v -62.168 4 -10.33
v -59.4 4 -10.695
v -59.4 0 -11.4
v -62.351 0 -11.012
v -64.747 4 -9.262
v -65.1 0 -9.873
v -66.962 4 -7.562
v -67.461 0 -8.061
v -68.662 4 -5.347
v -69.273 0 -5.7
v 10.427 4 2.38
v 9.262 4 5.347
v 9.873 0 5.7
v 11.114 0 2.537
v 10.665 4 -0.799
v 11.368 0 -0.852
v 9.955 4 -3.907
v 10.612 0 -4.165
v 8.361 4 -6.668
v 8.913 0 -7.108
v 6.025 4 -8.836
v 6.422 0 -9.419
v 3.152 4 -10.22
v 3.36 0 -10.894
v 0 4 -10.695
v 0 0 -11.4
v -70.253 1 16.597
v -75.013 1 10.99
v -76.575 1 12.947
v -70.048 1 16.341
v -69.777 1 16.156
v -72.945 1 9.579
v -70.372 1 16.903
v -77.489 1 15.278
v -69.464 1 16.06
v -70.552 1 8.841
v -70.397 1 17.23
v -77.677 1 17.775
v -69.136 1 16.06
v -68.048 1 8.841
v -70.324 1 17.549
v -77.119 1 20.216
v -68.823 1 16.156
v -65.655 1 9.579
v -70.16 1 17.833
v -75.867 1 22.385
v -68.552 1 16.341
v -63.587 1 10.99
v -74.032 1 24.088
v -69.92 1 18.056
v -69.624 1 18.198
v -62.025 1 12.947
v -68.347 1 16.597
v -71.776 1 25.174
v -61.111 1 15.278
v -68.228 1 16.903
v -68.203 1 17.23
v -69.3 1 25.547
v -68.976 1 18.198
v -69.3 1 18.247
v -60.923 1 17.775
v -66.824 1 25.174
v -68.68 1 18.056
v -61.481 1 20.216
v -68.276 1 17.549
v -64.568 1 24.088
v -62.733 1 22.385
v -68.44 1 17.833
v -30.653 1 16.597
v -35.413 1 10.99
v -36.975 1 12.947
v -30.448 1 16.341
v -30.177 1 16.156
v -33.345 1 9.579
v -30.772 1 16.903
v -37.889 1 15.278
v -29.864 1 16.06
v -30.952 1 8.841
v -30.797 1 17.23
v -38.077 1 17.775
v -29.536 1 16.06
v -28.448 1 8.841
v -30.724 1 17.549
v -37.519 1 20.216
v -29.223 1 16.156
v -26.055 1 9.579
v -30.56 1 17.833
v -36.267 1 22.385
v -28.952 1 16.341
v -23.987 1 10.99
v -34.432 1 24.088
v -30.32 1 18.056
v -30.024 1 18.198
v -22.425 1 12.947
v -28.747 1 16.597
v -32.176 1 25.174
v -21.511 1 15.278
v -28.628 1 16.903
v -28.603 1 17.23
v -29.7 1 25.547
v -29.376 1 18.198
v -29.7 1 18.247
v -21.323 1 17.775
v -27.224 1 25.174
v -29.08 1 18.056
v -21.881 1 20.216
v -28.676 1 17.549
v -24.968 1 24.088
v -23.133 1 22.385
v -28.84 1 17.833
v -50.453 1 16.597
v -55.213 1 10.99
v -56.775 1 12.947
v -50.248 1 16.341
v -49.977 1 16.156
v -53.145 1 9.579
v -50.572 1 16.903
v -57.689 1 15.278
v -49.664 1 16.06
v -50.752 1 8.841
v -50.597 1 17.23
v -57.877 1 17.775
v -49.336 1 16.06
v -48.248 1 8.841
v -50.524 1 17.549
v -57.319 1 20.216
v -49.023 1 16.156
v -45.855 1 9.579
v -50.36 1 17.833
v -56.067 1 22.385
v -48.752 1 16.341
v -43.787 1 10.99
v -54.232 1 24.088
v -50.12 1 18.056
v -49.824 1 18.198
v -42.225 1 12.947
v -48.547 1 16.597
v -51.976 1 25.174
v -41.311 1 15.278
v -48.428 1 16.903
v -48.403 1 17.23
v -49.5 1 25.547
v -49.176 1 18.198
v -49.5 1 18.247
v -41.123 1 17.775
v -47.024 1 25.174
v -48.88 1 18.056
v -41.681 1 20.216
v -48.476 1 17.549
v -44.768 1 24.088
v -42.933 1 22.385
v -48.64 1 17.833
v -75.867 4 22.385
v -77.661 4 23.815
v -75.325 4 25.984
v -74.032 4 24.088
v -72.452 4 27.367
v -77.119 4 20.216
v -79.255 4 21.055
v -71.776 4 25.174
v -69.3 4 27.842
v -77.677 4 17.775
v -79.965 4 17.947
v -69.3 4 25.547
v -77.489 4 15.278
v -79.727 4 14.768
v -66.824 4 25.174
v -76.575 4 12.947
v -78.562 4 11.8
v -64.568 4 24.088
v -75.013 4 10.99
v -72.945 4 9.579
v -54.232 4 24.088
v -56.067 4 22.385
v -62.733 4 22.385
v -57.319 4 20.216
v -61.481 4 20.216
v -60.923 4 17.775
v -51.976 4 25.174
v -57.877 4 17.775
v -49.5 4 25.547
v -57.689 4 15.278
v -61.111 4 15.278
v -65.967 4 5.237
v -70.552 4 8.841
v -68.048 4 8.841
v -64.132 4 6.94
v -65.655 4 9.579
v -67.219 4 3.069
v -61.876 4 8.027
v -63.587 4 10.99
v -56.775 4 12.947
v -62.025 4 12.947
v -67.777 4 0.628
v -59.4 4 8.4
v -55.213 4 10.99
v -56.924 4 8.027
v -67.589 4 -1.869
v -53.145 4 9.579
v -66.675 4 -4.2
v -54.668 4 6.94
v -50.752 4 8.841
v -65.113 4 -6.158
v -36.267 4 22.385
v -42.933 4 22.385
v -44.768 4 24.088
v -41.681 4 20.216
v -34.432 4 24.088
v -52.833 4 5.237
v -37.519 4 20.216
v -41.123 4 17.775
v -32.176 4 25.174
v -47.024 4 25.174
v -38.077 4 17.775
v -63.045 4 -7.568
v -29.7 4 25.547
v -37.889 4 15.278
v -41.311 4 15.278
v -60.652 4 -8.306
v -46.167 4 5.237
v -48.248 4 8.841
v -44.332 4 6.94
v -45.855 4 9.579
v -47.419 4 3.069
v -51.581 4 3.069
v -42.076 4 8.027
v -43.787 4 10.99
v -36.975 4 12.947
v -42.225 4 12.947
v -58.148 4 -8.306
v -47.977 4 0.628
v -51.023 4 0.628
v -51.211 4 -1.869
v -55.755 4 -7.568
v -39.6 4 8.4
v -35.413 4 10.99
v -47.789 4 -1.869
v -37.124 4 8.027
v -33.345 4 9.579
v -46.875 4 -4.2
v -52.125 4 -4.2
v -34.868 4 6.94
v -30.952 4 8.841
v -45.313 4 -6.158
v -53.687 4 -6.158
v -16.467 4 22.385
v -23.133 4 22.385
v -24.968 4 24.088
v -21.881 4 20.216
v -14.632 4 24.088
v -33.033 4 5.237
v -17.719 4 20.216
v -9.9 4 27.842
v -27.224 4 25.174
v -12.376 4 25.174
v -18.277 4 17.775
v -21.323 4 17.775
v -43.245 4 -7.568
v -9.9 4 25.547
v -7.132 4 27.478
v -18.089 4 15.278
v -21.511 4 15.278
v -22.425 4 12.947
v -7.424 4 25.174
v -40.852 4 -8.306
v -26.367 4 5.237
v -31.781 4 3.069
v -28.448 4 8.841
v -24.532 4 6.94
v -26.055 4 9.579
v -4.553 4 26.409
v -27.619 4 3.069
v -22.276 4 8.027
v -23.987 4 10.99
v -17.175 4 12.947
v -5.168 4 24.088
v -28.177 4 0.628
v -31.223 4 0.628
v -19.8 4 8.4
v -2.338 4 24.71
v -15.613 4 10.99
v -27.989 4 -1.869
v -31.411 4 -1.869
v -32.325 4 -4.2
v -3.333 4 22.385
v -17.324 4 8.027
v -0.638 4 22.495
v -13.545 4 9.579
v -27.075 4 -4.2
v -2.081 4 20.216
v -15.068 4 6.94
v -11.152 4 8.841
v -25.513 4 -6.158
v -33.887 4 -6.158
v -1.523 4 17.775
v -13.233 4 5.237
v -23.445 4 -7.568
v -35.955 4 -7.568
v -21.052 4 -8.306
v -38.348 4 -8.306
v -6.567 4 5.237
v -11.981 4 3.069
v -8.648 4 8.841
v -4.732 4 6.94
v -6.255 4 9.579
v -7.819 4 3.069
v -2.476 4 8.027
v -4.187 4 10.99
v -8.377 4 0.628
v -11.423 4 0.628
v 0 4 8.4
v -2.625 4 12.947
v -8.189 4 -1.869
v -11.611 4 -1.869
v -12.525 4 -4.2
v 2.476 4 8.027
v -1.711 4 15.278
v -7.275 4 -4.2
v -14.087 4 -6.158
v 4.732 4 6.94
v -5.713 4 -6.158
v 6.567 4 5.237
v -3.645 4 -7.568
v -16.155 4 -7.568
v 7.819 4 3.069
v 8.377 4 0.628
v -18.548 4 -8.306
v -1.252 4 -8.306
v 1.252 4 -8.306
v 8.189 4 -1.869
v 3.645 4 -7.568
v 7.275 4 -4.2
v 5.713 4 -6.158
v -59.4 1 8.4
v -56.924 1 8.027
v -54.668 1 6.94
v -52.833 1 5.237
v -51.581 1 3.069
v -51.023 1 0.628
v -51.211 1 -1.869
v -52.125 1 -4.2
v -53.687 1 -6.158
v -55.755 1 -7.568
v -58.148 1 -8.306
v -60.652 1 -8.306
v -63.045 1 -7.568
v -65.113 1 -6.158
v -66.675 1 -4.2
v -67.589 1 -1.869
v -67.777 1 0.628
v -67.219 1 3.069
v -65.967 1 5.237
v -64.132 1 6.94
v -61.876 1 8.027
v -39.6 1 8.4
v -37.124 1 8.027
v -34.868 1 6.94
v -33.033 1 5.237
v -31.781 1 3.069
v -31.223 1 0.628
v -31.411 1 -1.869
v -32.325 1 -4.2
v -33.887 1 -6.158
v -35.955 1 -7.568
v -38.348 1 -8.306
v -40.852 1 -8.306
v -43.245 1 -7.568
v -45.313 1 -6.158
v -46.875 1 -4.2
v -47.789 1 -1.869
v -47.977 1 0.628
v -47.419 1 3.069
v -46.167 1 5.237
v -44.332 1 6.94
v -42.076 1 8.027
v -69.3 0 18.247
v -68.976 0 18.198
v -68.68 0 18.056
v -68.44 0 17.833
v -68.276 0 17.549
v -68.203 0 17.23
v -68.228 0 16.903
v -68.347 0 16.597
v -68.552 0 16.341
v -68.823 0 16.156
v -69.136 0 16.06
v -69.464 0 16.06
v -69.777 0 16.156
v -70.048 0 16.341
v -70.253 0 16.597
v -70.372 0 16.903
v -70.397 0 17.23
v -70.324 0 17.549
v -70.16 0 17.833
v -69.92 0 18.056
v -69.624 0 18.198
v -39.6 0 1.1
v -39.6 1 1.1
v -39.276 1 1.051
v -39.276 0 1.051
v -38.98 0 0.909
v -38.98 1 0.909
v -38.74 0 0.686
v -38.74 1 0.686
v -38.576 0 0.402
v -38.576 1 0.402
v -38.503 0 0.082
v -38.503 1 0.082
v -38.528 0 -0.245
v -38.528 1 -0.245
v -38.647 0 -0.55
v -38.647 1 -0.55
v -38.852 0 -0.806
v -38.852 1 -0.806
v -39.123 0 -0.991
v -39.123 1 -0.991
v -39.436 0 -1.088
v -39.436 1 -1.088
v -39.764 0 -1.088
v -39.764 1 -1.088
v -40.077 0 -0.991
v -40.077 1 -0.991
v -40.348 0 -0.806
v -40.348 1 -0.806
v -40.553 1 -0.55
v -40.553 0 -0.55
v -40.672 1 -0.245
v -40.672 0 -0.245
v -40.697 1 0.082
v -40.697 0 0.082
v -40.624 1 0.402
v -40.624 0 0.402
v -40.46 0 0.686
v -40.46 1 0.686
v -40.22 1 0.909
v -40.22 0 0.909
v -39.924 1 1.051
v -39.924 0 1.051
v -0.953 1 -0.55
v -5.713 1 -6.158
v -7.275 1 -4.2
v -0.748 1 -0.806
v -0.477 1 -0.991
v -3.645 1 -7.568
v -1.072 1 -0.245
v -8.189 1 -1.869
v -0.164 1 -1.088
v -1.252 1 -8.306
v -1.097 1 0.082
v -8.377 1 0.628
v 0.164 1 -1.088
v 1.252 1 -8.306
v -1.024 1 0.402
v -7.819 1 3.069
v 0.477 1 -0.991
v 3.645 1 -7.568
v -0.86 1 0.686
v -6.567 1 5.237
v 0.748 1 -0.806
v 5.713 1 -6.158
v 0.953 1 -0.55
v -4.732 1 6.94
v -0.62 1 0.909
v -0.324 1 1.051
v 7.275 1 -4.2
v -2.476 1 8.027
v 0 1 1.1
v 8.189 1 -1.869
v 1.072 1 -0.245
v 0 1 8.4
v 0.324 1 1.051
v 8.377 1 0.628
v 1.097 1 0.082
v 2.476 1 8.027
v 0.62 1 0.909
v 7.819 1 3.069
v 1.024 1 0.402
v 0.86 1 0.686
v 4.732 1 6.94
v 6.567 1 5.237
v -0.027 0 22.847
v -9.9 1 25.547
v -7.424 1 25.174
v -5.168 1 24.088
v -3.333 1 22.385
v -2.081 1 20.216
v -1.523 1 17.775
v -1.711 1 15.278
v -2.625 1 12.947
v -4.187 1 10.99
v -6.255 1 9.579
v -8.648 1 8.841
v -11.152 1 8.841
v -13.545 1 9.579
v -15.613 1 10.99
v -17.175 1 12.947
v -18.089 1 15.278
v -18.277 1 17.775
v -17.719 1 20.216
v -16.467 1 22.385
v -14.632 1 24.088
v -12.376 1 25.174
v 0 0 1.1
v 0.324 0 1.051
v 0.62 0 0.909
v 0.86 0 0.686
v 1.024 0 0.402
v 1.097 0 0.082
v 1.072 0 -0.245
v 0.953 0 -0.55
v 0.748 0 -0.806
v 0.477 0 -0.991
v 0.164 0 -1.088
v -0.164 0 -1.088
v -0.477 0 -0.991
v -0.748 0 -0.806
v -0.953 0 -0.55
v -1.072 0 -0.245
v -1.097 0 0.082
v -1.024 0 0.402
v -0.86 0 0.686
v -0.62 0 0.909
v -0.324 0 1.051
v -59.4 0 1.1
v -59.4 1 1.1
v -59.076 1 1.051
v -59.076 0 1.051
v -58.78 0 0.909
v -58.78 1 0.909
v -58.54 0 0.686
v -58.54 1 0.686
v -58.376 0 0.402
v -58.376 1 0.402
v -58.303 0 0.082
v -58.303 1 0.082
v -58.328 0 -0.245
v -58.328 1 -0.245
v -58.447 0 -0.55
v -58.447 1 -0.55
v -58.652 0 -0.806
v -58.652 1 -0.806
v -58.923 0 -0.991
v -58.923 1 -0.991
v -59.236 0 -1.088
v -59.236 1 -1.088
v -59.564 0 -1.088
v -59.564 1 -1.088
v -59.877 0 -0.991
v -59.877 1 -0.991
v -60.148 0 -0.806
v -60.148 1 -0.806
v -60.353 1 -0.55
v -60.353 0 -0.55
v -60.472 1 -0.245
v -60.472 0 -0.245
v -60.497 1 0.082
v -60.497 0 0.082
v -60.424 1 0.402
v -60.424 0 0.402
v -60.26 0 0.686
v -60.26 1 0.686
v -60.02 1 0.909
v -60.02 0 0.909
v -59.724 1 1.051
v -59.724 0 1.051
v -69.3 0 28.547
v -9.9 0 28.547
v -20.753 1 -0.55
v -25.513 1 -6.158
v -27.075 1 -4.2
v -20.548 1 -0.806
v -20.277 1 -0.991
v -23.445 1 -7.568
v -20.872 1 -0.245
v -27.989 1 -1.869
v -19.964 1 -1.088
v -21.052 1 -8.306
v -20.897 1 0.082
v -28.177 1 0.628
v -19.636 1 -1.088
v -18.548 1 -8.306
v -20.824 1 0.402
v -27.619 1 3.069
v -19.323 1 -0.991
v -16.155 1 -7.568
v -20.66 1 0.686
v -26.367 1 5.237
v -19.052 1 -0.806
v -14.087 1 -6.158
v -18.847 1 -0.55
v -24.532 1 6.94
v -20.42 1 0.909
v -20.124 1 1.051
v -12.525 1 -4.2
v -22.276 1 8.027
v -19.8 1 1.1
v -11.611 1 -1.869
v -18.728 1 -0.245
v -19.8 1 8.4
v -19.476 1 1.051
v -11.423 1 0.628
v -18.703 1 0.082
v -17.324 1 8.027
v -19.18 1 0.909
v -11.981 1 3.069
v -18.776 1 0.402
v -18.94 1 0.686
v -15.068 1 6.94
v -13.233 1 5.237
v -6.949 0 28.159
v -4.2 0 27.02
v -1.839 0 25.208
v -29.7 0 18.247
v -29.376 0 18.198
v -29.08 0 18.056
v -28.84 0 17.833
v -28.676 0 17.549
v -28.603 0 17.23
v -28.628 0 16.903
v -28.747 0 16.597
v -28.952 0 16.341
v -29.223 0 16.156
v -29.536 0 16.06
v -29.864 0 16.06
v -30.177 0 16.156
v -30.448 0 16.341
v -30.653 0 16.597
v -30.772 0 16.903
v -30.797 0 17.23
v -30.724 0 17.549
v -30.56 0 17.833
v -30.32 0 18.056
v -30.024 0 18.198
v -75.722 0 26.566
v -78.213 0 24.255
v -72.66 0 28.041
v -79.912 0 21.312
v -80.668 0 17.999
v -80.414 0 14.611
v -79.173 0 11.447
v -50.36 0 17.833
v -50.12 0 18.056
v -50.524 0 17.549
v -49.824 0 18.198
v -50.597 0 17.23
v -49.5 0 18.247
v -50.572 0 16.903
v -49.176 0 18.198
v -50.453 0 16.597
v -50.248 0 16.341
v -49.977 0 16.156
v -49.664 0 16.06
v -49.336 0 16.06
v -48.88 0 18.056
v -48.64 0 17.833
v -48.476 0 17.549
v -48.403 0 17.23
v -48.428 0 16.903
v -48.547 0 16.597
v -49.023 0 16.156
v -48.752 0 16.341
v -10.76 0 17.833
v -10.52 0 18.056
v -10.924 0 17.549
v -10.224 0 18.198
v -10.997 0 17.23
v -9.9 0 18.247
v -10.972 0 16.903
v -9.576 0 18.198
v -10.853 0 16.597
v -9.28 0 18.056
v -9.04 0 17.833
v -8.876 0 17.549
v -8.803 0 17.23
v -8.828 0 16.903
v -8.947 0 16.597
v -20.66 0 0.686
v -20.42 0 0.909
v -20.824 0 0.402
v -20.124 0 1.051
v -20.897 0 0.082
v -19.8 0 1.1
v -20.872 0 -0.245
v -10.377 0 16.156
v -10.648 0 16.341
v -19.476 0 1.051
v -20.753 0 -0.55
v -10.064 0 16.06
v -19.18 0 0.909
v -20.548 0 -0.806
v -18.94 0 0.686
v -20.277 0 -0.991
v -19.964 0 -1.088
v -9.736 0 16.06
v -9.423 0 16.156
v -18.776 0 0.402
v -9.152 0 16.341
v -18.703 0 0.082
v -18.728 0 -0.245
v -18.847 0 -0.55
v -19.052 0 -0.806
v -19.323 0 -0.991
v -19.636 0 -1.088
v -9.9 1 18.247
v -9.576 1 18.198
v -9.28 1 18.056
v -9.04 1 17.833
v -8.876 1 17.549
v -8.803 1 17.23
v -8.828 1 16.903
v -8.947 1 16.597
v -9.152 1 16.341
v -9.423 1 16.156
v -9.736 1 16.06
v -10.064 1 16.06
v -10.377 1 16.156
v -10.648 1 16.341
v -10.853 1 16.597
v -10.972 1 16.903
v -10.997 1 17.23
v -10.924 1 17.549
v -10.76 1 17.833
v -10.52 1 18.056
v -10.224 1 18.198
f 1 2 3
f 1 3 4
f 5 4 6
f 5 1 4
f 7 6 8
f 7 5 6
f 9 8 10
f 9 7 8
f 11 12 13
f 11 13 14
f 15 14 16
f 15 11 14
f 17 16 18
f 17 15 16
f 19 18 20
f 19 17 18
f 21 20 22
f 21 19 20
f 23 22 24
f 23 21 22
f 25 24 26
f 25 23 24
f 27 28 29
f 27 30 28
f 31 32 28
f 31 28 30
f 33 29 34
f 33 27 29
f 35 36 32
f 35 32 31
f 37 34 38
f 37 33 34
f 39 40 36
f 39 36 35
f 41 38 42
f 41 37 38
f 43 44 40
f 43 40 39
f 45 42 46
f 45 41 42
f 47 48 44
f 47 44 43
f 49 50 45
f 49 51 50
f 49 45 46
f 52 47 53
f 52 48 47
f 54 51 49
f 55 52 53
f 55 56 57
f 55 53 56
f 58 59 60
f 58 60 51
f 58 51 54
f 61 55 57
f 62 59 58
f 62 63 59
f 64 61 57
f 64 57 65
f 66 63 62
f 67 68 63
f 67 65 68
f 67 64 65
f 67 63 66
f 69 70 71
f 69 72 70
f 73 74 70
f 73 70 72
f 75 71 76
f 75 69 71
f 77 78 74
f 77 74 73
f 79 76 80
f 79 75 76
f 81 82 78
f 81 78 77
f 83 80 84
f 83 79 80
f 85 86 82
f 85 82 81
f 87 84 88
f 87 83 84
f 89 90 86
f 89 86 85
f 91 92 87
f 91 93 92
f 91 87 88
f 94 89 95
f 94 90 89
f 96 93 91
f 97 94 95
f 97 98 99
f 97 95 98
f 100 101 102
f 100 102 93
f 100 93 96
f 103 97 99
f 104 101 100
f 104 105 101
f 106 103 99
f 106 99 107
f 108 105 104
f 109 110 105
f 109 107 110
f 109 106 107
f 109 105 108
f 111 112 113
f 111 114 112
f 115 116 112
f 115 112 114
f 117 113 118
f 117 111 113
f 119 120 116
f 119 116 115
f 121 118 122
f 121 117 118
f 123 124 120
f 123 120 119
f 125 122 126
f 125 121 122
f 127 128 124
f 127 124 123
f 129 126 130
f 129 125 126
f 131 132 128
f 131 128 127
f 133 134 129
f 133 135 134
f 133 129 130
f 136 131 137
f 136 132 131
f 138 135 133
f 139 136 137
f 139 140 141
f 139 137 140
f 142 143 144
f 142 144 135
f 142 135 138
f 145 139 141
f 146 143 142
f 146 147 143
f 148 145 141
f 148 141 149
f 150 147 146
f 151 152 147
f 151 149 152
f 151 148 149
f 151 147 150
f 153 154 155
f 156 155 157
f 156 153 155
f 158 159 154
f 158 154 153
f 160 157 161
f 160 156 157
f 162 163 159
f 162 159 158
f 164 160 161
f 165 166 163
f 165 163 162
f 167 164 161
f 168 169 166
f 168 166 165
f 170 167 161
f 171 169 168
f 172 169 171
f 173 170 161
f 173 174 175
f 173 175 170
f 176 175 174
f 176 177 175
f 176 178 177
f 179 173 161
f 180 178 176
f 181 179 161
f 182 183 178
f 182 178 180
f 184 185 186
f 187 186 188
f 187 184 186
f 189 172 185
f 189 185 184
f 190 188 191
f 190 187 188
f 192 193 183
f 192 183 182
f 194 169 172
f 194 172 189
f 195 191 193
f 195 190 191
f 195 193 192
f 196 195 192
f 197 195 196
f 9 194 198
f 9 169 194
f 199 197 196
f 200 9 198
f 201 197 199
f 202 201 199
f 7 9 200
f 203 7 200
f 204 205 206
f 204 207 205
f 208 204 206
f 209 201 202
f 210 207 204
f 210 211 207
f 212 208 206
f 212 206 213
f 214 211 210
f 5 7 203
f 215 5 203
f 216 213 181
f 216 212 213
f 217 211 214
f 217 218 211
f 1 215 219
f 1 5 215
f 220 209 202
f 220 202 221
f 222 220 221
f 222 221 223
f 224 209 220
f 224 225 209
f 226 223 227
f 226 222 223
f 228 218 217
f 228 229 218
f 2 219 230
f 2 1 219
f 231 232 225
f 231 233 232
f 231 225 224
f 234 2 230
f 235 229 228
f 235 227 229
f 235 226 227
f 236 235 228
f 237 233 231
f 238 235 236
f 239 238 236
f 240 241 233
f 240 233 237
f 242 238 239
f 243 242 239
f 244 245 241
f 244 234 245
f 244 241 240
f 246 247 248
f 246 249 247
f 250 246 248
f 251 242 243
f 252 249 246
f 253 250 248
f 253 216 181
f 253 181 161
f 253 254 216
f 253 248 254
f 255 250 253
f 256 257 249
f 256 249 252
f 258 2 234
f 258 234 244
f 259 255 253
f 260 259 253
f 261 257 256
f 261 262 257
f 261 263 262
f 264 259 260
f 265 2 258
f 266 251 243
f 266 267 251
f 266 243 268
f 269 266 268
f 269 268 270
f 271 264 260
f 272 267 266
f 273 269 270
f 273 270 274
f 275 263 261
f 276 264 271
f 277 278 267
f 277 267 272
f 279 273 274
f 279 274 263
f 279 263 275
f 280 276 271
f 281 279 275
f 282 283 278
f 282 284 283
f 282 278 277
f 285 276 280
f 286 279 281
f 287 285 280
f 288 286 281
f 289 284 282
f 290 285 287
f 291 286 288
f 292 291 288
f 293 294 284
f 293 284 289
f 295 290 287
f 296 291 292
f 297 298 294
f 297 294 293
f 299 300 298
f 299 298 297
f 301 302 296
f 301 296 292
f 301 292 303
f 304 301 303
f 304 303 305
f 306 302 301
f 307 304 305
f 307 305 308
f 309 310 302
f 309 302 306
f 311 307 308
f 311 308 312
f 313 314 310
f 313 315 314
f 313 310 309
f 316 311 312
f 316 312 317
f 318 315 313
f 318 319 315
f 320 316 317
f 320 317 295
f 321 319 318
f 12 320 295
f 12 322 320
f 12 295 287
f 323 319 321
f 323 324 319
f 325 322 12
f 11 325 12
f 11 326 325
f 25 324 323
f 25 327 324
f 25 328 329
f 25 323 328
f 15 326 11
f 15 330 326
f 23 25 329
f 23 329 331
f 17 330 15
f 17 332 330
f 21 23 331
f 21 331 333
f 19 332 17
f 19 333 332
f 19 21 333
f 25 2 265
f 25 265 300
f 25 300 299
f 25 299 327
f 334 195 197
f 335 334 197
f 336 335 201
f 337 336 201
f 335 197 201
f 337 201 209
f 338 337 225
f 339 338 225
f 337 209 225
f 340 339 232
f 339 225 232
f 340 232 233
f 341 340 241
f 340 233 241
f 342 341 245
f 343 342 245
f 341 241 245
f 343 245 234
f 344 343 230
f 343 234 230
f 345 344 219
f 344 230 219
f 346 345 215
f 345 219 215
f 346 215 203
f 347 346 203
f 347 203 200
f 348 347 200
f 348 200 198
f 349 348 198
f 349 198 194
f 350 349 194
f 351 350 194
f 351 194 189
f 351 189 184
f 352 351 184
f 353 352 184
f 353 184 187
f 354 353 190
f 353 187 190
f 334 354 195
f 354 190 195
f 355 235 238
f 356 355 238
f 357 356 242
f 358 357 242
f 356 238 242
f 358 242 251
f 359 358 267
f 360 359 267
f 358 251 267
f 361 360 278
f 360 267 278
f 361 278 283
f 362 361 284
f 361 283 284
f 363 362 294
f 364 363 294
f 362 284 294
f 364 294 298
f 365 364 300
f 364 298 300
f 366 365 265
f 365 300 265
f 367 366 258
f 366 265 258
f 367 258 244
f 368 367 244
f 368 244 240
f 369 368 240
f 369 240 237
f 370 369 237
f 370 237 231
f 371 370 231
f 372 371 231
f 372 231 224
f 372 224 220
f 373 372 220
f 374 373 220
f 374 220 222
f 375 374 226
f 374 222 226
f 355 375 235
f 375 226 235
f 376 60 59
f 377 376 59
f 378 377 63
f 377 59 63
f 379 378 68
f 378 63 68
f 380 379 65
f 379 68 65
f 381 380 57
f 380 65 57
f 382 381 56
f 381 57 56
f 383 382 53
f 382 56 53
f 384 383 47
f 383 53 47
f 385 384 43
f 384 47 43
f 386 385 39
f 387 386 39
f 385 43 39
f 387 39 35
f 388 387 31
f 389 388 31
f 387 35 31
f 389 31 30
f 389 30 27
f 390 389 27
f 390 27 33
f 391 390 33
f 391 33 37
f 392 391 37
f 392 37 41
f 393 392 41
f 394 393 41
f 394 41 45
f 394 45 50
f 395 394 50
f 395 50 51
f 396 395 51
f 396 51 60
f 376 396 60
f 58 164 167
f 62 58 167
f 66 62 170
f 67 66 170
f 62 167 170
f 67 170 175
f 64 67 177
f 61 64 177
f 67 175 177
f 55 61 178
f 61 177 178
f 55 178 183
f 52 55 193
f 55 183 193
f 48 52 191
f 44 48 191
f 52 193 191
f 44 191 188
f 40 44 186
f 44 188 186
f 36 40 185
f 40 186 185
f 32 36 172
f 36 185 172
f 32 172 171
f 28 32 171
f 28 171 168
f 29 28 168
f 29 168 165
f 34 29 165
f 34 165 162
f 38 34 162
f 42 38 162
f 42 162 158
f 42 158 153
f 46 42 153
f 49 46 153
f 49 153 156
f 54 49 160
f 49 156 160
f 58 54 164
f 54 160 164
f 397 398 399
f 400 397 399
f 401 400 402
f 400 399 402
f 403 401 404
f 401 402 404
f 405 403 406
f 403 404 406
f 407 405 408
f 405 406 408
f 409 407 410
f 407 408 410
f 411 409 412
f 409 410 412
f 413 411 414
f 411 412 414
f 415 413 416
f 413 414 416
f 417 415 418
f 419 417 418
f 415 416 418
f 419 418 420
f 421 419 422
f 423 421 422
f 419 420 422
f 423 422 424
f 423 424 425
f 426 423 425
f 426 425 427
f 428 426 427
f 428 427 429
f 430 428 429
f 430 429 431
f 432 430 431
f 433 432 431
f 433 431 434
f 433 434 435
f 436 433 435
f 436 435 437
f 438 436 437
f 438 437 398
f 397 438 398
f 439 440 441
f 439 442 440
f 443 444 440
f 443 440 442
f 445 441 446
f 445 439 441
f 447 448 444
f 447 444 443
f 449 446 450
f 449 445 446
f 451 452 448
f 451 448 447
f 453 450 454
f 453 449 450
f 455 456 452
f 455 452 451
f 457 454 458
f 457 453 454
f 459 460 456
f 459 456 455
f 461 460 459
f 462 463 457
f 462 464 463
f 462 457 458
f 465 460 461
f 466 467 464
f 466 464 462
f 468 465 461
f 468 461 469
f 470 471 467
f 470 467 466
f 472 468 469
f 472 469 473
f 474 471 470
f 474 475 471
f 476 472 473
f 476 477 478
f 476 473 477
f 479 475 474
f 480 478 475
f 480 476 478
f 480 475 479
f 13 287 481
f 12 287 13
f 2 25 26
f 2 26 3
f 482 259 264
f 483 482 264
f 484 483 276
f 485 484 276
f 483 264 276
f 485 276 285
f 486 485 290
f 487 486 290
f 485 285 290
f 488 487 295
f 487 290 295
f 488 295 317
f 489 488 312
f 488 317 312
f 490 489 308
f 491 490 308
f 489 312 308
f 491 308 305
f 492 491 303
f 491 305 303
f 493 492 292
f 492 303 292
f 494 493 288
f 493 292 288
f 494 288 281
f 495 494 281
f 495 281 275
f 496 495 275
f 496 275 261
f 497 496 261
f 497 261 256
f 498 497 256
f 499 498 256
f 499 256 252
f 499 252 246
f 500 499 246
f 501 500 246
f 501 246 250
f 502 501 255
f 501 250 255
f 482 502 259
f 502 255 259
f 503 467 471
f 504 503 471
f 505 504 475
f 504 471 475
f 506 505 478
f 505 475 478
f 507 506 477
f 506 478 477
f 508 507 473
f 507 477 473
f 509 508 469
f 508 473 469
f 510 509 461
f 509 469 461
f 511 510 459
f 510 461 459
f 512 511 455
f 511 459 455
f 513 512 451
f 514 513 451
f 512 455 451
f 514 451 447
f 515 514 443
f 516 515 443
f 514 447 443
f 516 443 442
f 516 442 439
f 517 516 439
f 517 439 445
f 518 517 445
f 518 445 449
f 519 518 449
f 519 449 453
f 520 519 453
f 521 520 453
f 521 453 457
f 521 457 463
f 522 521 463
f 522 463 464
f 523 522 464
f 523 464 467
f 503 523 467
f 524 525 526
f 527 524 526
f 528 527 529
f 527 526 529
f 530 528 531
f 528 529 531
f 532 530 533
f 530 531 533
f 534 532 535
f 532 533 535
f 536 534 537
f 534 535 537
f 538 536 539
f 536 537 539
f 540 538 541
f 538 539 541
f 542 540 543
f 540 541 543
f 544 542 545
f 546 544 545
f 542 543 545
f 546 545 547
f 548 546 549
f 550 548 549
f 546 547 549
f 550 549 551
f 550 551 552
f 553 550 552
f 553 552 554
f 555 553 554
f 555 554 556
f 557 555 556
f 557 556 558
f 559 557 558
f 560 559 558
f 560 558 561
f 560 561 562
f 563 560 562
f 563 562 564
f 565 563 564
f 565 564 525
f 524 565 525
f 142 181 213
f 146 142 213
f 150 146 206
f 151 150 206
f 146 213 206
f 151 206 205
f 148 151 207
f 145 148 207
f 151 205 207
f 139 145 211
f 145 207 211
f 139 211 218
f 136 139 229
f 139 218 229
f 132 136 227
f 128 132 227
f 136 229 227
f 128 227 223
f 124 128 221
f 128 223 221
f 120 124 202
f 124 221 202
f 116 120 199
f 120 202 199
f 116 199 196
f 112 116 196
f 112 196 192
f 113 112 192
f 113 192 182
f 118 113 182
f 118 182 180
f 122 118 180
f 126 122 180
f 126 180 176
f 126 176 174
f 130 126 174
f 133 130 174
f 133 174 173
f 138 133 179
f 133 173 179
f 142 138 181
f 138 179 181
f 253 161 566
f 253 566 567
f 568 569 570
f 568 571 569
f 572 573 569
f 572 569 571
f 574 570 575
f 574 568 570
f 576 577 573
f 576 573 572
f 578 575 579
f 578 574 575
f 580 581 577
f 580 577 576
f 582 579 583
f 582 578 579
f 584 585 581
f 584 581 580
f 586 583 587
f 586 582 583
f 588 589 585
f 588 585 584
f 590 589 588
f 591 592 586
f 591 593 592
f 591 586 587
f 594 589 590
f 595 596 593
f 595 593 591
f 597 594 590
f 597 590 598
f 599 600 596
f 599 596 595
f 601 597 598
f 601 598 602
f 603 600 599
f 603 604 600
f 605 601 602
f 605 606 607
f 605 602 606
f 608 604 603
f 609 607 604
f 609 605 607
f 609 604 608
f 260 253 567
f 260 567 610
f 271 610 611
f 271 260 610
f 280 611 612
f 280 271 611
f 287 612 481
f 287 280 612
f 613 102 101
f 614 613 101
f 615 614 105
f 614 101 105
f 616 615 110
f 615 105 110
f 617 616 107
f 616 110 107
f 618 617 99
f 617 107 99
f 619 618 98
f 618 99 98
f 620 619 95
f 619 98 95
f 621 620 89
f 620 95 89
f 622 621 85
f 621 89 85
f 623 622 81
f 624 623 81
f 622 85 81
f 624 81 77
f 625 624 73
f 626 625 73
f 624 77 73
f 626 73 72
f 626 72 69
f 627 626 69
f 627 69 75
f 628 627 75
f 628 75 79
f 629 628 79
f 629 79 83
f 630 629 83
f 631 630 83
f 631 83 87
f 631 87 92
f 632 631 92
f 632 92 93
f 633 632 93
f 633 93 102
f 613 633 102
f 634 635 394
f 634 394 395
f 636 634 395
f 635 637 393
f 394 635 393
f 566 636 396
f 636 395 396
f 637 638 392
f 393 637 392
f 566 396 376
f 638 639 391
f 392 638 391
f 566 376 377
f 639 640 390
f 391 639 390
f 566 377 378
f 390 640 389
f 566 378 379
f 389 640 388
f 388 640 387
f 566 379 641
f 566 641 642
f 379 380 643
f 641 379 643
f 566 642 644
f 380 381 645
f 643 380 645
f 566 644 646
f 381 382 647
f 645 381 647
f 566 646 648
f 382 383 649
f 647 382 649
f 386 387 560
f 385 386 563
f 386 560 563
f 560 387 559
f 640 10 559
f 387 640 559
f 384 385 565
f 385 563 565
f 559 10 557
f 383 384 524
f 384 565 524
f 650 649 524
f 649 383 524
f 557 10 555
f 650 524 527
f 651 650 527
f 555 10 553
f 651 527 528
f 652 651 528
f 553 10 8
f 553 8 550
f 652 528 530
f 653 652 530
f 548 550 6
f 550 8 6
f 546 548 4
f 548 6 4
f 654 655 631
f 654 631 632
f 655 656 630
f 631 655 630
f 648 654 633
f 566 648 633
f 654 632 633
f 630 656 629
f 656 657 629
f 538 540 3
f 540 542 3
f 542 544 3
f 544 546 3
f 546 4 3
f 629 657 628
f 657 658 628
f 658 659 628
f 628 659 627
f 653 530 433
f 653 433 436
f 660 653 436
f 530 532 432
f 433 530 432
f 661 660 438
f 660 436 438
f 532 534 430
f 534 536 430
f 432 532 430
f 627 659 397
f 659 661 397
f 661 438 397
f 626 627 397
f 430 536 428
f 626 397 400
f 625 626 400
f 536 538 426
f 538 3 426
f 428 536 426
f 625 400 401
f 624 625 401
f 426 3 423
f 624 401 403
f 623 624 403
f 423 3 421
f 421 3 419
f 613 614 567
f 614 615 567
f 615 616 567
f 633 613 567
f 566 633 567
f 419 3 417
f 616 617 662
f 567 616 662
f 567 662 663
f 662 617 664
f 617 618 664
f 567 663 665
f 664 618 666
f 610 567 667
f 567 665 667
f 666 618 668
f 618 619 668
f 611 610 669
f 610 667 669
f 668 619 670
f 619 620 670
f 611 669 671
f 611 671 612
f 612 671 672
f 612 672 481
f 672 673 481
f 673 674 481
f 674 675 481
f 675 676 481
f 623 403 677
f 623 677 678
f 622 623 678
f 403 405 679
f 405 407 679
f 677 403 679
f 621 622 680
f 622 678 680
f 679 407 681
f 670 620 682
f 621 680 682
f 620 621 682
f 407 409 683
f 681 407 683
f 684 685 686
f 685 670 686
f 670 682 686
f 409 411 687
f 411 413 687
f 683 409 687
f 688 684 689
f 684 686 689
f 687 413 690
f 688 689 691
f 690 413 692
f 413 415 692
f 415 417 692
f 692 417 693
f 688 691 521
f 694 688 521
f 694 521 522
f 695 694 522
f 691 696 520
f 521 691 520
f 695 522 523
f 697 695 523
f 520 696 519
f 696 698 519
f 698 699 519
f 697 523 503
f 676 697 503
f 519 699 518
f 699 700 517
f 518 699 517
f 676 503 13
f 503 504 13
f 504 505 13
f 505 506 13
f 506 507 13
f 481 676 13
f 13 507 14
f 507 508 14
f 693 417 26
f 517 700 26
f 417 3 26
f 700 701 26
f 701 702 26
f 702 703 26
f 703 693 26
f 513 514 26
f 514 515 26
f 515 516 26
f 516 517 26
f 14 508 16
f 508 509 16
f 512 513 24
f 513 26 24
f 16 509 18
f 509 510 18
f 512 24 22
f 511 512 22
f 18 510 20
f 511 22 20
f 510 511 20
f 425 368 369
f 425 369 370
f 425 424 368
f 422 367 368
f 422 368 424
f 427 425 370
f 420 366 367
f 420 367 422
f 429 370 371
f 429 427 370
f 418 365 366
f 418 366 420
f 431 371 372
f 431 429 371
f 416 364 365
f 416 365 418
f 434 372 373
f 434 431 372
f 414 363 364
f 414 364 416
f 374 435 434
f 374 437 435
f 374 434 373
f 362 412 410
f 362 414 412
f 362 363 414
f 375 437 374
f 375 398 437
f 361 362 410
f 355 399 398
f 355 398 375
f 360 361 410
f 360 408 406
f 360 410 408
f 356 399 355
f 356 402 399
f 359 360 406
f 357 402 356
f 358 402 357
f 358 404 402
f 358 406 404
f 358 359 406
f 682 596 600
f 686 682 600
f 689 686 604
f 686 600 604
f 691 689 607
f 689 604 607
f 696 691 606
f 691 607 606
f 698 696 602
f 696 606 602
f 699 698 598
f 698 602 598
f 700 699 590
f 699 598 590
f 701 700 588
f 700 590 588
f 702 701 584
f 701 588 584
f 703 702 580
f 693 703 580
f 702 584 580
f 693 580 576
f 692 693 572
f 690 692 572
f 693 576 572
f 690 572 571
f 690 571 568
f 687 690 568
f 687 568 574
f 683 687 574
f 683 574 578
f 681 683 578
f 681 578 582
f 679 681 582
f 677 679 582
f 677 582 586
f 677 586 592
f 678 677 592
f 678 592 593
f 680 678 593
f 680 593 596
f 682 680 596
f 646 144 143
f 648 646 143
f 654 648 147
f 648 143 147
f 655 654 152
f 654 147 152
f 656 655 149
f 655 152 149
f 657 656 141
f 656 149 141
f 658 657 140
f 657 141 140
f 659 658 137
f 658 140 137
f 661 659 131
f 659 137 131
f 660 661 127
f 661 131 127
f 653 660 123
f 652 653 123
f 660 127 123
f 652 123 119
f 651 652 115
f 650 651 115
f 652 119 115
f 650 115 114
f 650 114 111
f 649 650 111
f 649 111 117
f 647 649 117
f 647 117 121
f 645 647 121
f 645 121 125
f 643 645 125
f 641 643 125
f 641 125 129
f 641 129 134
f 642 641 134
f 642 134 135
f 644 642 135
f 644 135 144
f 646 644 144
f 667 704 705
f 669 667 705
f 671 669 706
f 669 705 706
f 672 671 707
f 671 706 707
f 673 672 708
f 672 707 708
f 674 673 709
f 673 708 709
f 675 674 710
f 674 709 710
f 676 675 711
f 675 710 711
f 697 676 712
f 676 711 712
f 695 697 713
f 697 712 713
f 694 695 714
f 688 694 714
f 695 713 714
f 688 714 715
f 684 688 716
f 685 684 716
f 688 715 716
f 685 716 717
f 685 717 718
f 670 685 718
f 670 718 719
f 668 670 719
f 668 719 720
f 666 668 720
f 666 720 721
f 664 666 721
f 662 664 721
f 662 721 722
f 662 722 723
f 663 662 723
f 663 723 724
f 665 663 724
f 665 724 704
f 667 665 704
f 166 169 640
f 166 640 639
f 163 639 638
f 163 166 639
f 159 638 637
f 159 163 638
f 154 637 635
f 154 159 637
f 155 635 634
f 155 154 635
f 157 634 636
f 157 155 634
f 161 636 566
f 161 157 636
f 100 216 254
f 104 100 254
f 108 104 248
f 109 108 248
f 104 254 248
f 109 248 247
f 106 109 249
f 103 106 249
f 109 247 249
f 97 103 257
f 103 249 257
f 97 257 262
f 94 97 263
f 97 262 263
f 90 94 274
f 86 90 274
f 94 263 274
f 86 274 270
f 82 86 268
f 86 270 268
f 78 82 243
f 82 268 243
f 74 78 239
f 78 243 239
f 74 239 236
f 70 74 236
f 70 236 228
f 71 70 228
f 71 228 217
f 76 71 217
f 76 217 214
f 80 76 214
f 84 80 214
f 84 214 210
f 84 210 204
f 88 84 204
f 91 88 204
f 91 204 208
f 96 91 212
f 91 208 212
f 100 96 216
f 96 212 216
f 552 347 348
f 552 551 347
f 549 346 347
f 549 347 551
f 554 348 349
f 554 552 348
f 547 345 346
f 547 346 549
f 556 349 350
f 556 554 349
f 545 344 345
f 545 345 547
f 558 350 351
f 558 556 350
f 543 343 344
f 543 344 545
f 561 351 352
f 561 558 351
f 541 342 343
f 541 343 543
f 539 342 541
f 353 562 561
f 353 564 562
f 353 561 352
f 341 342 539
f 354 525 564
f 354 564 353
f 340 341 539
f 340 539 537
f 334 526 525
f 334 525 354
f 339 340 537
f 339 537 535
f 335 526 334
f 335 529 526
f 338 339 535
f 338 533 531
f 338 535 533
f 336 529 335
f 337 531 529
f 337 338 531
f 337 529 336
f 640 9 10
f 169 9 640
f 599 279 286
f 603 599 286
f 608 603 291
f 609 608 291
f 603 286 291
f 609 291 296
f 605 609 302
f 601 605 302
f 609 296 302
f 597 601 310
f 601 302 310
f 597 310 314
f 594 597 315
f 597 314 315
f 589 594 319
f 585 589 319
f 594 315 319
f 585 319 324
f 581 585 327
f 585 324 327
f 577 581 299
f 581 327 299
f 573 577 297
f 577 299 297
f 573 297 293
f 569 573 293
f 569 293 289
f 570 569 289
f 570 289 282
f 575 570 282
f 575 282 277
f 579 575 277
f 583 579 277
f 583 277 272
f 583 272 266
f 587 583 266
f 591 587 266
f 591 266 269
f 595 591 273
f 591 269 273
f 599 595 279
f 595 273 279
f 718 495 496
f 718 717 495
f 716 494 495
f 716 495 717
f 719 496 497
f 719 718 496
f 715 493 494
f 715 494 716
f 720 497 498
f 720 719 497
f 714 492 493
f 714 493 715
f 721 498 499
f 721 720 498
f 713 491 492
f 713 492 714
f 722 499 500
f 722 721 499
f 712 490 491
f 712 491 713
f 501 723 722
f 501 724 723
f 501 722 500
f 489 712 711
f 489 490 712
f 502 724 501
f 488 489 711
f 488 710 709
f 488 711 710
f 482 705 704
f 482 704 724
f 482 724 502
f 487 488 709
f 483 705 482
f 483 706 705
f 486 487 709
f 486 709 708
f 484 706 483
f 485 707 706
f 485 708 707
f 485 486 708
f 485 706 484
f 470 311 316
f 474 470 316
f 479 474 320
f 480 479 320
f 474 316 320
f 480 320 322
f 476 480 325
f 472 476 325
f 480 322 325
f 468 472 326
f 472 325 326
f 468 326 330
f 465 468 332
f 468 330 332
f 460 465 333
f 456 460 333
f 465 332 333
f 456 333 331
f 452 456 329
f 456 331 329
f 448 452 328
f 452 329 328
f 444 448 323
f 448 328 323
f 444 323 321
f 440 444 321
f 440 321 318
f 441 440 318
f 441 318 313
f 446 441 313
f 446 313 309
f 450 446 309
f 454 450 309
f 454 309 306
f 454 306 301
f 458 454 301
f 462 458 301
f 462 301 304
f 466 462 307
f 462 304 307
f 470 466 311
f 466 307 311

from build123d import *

# Parameters (mm, degrees)
BOSS_EXTRUDE1_DEPTH = 4
BOSS_EXTRUDE1_DRAFT = 10
CUT_EXTRUDE1_START  = 4
SKETCH1_3_R         = 1.1
CUT_EXTRUDE1_DEPTH  = 4
CUT_EXTRUDE2_START  = 4
SKETCH1_4_R         = 8.4
SKETCH1_4_R_2       = 1.1
CUT_EXTRUDE2_DEPTH  = 3


# Read off the part's stored shape, not the designer's step: Boss-Extrude1
with BuildPart() as part:
    # Boss-Extrude1 outline → Boss-Extrude1 (with draft: the straight prism first)
    with BuildSketch(Plane(origin=(0, 4, 0), x_dir=(1, 0, 0), z_dir=(0, 1, 0))):
        with BuildLine():
            ThreePointArc((-78.561875024, -11.799956956), (-78.561875024, -22.494649034), (-69.3, -27.841995072))
            Line((-69.3, -27.841995072), (-9.9, -27.841995072))
            ThreePointArc((-9.9, -27.841995072), (-4.552653961, -26.409178019), (-0.638124976, -22.494649034))
            Line((-0.638124976, -22.494649034), (9.261875024, -5.347346039))
            ThreePointArc((9.261875024, -5.347346039), (9.261875024, 5.347346039), (0, 10.694692077))
            Line((0, 10.694692077), (-59.4, 10.694692077))
            ThreePointArc((-59.4, 10.694692077), (-64.747346039, 9.261875024), (-68.661875024, 5.347346039))
            Line((-68.661875024, 5.347346039), (-78.561875024, -11.799956956))
        make_face()
    extrude(amount=-BOSS_EXTRUDE1_DEPTH)
    # Boss-Extrude1: the draft: its side faces are tilted about the plane it starts from
    boss_extrude1_sides = [part.faces().sort_by_distance(p)[0] for p in [
        (-73.611875024, 2, 3.226305459),
        (-78.561875024, 2, 22.494649033),
        (-39.6, 2, 27.841995072),
        (-4.552653962, 2, 26.409178019),
        (4.311875024, 2, 13.920997536),
        (9.261875024, 2, -5.347346038),
        (-29.7, 2, -10.694692077),
        (-64.747346038, 2, -9.261875024),
    ]]
    draft(boss_extrude1_sides, Plane(origin=(0, 4, 0), x_dir=(1, 0, 0), z_dir=(0, 1, 0)), BOSS_EXTRUDE1_DRAFT)

    # Sketch1<3> → Cut-Extrude1 (cut)
    with BuildSketch(Plane(origin=(0, 0, 0), x_dir=(1, 0, 0), z_dir=(0, 1, 0)).offset(CUT_EXTRUDE1_START)):
        with Locations(Location((-9.9, -17.147302995, 0), (0, 0, 270))):
            Circle(SKETCH1_3_R)
        with Locations(Location((0, 0, 0), (0, 0, 270))):
            Circle(SKETCH1_3_R)
        with Locations(Location((-29.7, -17.147302995, 0), (0, 0, 270))):
            Circle(SKETCH1_3_R)
        with Locations(Location((-39.6, 0, 0), (0, 0, 270))):
            Circle(SKETCH1_3_R)
        with Locations(Location((-49.5, -17.147302995, 0), (0, 0, 270))):
            Circle(SKETCH1_3_R)
        with Locations(Location((-59.4, 0, 0), (0, 0, 270))):
            Circle(SKETCH1_3_R)
        with Locations(Location((-69.3, -17.147302995, 0), (0, 0, 270))):
            Circle(SKETCH1_3_R)
        with Locations(Location((-19.8, 0, 0), (0, 0, 270))):
            Circle(SKETCH1_3_R)
    extrude(amount=-CUT_EXTRUDE1_DEPTH, mode=Mode.SUBTRACT)

    # Sketch1<4> → Cut-Extrude2 (cut)
    # profile 1 of 8: a face of its own
    with BuildSketch(Plane(origin=(0, 0, 0), x_dir=(1, 0, 0), z_dir=(0, 1, 0)).offset(CUT_EXTRUDE2_START)):
        with Locations(Location((-19.8, 0, 0), (0, 0, 270))):
            Circle(SKETCH1_4_R)
        with Locations(Location((-19.8, 0, 0), (0, 0, 270))):
            Circle(SKETCH1_4_R_2, mode=Mode.SUBTRACT)
    # profile 2 of 8: a face of its own
    with BuildSketch(Plane(origin=(0, 0, 0), x_dir=(1, 0, 0), z_dir=(0, 1, 0)).offset(CUT_EXTRUDE2_START)):
        with Locations(Location((-9.9, -17.147302995, 0), (0, 0, 270))):
            Circle(SKETCH1_4_R)
        with Locations(Location((-9.9, -17.147302995, 0), (0, 0, 270))):
            Circle(SKETCH1_4_R_2, mode=Mode.SUBTRACT)
    # profile 3 of 8: a face of its own
    with BuildSketch(Plane(origin=(0, 0, 0), x_dir=(1, 0, 0), z_dir=(0, 1, 0)).offset(CUT_EXTRUDE2_START)):
        with Locations(Location((0, 0, 0), (0, 0, 270))):
            Circle(SKETCH1_4_R)
        with Locations(Location((0, 0, 0), (0, 0, 270))):
            Circle(SKETCH1_4_R_2, mode=Mode.SUBTRACT)
    # profile 4 of 8: a face of its own
    with BuildSketch(Plane(origin=(0, 0, 0), x_dir=(1, 0, 0), z_dir=(0, 1, 0)).offset(CUT_EXTRUDE2_START)):
        with Locations(Location((-29.7, -17.147302995, 0), (0, 0, 270))):
            Circle(SKETCH1_4_R)
        with Locations(Location((-29.7, -17.147302995, 0), (0, 0, 270))):
            Circle(SKETCH1_4_R_2, mode=Mode.SUBTRACT)
    # profile 5 of 8: a face of its own
    with BuildSketch(Plane(origin=(0, 0, 0), x_dir=(1, 0, 0), z_dir=(0, 1, 0)).offset(CUT_EXTRUDE2_START)):
        with Locations(Location((-39.6, 0, 0), (0, 0, 270))):
            Circle(SKETCH1_4_R)
        with Locations(Location((-39.6, 0, 0), (0, 0, 270))):
            Circle(SKETCH1_4_R_2, mode=Mode.SUBTRACT)
    # profile 6 of 8: a face of its own
    with BuildSketch(Plane(origin=(0, 0, 0), x_dir=(1, 0, 0), z_dir=(0, 1, 0)).offset(CUT_EXTRUDE2_START)):
        with Locations(Location((-49.5, -17.147302995, 0), (0, 0, 270))):
            Circle(SKETCH1_4_R)
        with Locations(Location((-49.5, -17.147302995, 0), (0, 0, 270))):
            Circle(SKETCH1_4_R_2, mode=Mode.SUBTRACT)
    # profile 7 of 8: a face of its own
    with BuildSketch(Plane(origin=(0, 0, 0), x_dir=(1, 0, 0), z_dir=(0, 1, 0)).offset(CUT_EXTRUDE2_START)):
        with Locations(Location((-59.4, 0, 0), (0, 0, 270))):
            Circle(SKETCH1_4_R)
        with Locations(Location((-59.4, 0, 0), (0, 0, 270))):
            Circle(SKETCH1_4_R_2, mode=Mode.SUBTRACT)
    # profile 8 of 8: a face of its own
    with BuildSketch(Plane(origin=(0, 0, 0), x_dir=(1, 0, 0), z_dir=(0, 1, 0)).offset(CUT_EXTRUDE2_START)):
        with Locations(Location((-69.3, -17.147302995, 0), (0, 0, 270))):
            Circle(SKETCH1_4_R)
        with Locations(Location((-69.3, -17.147302995, 0), (0, 0, 270))):
            Circle(SKETCH1_4_R_2, mode=Mode.SUBTRACT)
    extrude(amount=-CUT_EXTRUDE2_DEPTH, mode=Mode.SUBTRACT)


solid = part.part
